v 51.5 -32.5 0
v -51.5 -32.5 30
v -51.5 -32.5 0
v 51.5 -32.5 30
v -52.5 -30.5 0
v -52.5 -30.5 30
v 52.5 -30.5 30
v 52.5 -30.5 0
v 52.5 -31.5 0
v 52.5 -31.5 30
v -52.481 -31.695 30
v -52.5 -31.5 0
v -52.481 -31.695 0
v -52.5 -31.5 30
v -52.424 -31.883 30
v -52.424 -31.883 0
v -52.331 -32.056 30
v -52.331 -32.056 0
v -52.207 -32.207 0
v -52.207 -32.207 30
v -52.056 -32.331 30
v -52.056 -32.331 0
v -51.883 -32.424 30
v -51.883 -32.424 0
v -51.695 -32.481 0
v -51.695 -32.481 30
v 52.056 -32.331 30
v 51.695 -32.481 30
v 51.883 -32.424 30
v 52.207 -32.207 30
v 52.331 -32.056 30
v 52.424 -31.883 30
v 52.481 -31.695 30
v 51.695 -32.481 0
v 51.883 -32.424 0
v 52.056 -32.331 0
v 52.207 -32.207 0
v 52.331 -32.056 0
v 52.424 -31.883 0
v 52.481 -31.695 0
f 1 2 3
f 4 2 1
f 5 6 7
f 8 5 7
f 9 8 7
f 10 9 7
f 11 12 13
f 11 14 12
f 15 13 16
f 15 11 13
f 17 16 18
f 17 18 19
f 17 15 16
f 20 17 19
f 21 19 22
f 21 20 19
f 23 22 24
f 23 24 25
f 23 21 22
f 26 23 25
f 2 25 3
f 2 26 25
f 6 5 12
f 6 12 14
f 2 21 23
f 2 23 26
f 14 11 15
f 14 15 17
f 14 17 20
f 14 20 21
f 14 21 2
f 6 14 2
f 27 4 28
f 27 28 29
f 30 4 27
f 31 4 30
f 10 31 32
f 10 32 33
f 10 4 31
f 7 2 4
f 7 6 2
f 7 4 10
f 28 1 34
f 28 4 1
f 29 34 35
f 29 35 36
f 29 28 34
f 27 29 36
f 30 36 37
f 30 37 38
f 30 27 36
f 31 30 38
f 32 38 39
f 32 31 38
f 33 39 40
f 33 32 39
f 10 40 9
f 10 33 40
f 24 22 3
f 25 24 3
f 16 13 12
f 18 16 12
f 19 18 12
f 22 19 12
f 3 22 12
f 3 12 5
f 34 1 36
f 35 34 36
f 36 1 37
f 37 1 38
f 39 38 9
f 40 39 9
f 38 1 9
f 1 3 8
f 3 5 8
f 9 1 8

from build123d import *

# Parameters (mm, degrees)
SKETCH002_W  = 105
SKETCH002_H  = 30
PAD001_DEPTH = 2
FILLET002_R  = 1
FILLET003_R  = 1


with BuildPart() as part:
    # Sketch002 → Pad001 (new body)
    with BuildSketch(Plane.XZ):
        with Locations((0, 15)):
            Rectangle(SKETCH002_W, SKETCH002_H)
    extrude(amount=PAD001_DEPTH)

    # Fillet002
    fillet002_edges = [part.edges().sort_by_distance(p)[0] for p in [
        (-52.5, -2, 15),
    ]]
    fillet(fillet002_edges, radius=FILLET002_R)

    # Fillet003
    fillet003_edges = [part.edges().sort_by_distance(p)[0] for p in [
        (52.5, -2, 15),
    ]]
    fillet(fillet003_edges, radius=FILLET003_R)


with BuildPart() as part_1:
    # Body001 placement: moved
    add(part.part.moved(Location((0, -30.5, 0))))


solid = part_1.part
